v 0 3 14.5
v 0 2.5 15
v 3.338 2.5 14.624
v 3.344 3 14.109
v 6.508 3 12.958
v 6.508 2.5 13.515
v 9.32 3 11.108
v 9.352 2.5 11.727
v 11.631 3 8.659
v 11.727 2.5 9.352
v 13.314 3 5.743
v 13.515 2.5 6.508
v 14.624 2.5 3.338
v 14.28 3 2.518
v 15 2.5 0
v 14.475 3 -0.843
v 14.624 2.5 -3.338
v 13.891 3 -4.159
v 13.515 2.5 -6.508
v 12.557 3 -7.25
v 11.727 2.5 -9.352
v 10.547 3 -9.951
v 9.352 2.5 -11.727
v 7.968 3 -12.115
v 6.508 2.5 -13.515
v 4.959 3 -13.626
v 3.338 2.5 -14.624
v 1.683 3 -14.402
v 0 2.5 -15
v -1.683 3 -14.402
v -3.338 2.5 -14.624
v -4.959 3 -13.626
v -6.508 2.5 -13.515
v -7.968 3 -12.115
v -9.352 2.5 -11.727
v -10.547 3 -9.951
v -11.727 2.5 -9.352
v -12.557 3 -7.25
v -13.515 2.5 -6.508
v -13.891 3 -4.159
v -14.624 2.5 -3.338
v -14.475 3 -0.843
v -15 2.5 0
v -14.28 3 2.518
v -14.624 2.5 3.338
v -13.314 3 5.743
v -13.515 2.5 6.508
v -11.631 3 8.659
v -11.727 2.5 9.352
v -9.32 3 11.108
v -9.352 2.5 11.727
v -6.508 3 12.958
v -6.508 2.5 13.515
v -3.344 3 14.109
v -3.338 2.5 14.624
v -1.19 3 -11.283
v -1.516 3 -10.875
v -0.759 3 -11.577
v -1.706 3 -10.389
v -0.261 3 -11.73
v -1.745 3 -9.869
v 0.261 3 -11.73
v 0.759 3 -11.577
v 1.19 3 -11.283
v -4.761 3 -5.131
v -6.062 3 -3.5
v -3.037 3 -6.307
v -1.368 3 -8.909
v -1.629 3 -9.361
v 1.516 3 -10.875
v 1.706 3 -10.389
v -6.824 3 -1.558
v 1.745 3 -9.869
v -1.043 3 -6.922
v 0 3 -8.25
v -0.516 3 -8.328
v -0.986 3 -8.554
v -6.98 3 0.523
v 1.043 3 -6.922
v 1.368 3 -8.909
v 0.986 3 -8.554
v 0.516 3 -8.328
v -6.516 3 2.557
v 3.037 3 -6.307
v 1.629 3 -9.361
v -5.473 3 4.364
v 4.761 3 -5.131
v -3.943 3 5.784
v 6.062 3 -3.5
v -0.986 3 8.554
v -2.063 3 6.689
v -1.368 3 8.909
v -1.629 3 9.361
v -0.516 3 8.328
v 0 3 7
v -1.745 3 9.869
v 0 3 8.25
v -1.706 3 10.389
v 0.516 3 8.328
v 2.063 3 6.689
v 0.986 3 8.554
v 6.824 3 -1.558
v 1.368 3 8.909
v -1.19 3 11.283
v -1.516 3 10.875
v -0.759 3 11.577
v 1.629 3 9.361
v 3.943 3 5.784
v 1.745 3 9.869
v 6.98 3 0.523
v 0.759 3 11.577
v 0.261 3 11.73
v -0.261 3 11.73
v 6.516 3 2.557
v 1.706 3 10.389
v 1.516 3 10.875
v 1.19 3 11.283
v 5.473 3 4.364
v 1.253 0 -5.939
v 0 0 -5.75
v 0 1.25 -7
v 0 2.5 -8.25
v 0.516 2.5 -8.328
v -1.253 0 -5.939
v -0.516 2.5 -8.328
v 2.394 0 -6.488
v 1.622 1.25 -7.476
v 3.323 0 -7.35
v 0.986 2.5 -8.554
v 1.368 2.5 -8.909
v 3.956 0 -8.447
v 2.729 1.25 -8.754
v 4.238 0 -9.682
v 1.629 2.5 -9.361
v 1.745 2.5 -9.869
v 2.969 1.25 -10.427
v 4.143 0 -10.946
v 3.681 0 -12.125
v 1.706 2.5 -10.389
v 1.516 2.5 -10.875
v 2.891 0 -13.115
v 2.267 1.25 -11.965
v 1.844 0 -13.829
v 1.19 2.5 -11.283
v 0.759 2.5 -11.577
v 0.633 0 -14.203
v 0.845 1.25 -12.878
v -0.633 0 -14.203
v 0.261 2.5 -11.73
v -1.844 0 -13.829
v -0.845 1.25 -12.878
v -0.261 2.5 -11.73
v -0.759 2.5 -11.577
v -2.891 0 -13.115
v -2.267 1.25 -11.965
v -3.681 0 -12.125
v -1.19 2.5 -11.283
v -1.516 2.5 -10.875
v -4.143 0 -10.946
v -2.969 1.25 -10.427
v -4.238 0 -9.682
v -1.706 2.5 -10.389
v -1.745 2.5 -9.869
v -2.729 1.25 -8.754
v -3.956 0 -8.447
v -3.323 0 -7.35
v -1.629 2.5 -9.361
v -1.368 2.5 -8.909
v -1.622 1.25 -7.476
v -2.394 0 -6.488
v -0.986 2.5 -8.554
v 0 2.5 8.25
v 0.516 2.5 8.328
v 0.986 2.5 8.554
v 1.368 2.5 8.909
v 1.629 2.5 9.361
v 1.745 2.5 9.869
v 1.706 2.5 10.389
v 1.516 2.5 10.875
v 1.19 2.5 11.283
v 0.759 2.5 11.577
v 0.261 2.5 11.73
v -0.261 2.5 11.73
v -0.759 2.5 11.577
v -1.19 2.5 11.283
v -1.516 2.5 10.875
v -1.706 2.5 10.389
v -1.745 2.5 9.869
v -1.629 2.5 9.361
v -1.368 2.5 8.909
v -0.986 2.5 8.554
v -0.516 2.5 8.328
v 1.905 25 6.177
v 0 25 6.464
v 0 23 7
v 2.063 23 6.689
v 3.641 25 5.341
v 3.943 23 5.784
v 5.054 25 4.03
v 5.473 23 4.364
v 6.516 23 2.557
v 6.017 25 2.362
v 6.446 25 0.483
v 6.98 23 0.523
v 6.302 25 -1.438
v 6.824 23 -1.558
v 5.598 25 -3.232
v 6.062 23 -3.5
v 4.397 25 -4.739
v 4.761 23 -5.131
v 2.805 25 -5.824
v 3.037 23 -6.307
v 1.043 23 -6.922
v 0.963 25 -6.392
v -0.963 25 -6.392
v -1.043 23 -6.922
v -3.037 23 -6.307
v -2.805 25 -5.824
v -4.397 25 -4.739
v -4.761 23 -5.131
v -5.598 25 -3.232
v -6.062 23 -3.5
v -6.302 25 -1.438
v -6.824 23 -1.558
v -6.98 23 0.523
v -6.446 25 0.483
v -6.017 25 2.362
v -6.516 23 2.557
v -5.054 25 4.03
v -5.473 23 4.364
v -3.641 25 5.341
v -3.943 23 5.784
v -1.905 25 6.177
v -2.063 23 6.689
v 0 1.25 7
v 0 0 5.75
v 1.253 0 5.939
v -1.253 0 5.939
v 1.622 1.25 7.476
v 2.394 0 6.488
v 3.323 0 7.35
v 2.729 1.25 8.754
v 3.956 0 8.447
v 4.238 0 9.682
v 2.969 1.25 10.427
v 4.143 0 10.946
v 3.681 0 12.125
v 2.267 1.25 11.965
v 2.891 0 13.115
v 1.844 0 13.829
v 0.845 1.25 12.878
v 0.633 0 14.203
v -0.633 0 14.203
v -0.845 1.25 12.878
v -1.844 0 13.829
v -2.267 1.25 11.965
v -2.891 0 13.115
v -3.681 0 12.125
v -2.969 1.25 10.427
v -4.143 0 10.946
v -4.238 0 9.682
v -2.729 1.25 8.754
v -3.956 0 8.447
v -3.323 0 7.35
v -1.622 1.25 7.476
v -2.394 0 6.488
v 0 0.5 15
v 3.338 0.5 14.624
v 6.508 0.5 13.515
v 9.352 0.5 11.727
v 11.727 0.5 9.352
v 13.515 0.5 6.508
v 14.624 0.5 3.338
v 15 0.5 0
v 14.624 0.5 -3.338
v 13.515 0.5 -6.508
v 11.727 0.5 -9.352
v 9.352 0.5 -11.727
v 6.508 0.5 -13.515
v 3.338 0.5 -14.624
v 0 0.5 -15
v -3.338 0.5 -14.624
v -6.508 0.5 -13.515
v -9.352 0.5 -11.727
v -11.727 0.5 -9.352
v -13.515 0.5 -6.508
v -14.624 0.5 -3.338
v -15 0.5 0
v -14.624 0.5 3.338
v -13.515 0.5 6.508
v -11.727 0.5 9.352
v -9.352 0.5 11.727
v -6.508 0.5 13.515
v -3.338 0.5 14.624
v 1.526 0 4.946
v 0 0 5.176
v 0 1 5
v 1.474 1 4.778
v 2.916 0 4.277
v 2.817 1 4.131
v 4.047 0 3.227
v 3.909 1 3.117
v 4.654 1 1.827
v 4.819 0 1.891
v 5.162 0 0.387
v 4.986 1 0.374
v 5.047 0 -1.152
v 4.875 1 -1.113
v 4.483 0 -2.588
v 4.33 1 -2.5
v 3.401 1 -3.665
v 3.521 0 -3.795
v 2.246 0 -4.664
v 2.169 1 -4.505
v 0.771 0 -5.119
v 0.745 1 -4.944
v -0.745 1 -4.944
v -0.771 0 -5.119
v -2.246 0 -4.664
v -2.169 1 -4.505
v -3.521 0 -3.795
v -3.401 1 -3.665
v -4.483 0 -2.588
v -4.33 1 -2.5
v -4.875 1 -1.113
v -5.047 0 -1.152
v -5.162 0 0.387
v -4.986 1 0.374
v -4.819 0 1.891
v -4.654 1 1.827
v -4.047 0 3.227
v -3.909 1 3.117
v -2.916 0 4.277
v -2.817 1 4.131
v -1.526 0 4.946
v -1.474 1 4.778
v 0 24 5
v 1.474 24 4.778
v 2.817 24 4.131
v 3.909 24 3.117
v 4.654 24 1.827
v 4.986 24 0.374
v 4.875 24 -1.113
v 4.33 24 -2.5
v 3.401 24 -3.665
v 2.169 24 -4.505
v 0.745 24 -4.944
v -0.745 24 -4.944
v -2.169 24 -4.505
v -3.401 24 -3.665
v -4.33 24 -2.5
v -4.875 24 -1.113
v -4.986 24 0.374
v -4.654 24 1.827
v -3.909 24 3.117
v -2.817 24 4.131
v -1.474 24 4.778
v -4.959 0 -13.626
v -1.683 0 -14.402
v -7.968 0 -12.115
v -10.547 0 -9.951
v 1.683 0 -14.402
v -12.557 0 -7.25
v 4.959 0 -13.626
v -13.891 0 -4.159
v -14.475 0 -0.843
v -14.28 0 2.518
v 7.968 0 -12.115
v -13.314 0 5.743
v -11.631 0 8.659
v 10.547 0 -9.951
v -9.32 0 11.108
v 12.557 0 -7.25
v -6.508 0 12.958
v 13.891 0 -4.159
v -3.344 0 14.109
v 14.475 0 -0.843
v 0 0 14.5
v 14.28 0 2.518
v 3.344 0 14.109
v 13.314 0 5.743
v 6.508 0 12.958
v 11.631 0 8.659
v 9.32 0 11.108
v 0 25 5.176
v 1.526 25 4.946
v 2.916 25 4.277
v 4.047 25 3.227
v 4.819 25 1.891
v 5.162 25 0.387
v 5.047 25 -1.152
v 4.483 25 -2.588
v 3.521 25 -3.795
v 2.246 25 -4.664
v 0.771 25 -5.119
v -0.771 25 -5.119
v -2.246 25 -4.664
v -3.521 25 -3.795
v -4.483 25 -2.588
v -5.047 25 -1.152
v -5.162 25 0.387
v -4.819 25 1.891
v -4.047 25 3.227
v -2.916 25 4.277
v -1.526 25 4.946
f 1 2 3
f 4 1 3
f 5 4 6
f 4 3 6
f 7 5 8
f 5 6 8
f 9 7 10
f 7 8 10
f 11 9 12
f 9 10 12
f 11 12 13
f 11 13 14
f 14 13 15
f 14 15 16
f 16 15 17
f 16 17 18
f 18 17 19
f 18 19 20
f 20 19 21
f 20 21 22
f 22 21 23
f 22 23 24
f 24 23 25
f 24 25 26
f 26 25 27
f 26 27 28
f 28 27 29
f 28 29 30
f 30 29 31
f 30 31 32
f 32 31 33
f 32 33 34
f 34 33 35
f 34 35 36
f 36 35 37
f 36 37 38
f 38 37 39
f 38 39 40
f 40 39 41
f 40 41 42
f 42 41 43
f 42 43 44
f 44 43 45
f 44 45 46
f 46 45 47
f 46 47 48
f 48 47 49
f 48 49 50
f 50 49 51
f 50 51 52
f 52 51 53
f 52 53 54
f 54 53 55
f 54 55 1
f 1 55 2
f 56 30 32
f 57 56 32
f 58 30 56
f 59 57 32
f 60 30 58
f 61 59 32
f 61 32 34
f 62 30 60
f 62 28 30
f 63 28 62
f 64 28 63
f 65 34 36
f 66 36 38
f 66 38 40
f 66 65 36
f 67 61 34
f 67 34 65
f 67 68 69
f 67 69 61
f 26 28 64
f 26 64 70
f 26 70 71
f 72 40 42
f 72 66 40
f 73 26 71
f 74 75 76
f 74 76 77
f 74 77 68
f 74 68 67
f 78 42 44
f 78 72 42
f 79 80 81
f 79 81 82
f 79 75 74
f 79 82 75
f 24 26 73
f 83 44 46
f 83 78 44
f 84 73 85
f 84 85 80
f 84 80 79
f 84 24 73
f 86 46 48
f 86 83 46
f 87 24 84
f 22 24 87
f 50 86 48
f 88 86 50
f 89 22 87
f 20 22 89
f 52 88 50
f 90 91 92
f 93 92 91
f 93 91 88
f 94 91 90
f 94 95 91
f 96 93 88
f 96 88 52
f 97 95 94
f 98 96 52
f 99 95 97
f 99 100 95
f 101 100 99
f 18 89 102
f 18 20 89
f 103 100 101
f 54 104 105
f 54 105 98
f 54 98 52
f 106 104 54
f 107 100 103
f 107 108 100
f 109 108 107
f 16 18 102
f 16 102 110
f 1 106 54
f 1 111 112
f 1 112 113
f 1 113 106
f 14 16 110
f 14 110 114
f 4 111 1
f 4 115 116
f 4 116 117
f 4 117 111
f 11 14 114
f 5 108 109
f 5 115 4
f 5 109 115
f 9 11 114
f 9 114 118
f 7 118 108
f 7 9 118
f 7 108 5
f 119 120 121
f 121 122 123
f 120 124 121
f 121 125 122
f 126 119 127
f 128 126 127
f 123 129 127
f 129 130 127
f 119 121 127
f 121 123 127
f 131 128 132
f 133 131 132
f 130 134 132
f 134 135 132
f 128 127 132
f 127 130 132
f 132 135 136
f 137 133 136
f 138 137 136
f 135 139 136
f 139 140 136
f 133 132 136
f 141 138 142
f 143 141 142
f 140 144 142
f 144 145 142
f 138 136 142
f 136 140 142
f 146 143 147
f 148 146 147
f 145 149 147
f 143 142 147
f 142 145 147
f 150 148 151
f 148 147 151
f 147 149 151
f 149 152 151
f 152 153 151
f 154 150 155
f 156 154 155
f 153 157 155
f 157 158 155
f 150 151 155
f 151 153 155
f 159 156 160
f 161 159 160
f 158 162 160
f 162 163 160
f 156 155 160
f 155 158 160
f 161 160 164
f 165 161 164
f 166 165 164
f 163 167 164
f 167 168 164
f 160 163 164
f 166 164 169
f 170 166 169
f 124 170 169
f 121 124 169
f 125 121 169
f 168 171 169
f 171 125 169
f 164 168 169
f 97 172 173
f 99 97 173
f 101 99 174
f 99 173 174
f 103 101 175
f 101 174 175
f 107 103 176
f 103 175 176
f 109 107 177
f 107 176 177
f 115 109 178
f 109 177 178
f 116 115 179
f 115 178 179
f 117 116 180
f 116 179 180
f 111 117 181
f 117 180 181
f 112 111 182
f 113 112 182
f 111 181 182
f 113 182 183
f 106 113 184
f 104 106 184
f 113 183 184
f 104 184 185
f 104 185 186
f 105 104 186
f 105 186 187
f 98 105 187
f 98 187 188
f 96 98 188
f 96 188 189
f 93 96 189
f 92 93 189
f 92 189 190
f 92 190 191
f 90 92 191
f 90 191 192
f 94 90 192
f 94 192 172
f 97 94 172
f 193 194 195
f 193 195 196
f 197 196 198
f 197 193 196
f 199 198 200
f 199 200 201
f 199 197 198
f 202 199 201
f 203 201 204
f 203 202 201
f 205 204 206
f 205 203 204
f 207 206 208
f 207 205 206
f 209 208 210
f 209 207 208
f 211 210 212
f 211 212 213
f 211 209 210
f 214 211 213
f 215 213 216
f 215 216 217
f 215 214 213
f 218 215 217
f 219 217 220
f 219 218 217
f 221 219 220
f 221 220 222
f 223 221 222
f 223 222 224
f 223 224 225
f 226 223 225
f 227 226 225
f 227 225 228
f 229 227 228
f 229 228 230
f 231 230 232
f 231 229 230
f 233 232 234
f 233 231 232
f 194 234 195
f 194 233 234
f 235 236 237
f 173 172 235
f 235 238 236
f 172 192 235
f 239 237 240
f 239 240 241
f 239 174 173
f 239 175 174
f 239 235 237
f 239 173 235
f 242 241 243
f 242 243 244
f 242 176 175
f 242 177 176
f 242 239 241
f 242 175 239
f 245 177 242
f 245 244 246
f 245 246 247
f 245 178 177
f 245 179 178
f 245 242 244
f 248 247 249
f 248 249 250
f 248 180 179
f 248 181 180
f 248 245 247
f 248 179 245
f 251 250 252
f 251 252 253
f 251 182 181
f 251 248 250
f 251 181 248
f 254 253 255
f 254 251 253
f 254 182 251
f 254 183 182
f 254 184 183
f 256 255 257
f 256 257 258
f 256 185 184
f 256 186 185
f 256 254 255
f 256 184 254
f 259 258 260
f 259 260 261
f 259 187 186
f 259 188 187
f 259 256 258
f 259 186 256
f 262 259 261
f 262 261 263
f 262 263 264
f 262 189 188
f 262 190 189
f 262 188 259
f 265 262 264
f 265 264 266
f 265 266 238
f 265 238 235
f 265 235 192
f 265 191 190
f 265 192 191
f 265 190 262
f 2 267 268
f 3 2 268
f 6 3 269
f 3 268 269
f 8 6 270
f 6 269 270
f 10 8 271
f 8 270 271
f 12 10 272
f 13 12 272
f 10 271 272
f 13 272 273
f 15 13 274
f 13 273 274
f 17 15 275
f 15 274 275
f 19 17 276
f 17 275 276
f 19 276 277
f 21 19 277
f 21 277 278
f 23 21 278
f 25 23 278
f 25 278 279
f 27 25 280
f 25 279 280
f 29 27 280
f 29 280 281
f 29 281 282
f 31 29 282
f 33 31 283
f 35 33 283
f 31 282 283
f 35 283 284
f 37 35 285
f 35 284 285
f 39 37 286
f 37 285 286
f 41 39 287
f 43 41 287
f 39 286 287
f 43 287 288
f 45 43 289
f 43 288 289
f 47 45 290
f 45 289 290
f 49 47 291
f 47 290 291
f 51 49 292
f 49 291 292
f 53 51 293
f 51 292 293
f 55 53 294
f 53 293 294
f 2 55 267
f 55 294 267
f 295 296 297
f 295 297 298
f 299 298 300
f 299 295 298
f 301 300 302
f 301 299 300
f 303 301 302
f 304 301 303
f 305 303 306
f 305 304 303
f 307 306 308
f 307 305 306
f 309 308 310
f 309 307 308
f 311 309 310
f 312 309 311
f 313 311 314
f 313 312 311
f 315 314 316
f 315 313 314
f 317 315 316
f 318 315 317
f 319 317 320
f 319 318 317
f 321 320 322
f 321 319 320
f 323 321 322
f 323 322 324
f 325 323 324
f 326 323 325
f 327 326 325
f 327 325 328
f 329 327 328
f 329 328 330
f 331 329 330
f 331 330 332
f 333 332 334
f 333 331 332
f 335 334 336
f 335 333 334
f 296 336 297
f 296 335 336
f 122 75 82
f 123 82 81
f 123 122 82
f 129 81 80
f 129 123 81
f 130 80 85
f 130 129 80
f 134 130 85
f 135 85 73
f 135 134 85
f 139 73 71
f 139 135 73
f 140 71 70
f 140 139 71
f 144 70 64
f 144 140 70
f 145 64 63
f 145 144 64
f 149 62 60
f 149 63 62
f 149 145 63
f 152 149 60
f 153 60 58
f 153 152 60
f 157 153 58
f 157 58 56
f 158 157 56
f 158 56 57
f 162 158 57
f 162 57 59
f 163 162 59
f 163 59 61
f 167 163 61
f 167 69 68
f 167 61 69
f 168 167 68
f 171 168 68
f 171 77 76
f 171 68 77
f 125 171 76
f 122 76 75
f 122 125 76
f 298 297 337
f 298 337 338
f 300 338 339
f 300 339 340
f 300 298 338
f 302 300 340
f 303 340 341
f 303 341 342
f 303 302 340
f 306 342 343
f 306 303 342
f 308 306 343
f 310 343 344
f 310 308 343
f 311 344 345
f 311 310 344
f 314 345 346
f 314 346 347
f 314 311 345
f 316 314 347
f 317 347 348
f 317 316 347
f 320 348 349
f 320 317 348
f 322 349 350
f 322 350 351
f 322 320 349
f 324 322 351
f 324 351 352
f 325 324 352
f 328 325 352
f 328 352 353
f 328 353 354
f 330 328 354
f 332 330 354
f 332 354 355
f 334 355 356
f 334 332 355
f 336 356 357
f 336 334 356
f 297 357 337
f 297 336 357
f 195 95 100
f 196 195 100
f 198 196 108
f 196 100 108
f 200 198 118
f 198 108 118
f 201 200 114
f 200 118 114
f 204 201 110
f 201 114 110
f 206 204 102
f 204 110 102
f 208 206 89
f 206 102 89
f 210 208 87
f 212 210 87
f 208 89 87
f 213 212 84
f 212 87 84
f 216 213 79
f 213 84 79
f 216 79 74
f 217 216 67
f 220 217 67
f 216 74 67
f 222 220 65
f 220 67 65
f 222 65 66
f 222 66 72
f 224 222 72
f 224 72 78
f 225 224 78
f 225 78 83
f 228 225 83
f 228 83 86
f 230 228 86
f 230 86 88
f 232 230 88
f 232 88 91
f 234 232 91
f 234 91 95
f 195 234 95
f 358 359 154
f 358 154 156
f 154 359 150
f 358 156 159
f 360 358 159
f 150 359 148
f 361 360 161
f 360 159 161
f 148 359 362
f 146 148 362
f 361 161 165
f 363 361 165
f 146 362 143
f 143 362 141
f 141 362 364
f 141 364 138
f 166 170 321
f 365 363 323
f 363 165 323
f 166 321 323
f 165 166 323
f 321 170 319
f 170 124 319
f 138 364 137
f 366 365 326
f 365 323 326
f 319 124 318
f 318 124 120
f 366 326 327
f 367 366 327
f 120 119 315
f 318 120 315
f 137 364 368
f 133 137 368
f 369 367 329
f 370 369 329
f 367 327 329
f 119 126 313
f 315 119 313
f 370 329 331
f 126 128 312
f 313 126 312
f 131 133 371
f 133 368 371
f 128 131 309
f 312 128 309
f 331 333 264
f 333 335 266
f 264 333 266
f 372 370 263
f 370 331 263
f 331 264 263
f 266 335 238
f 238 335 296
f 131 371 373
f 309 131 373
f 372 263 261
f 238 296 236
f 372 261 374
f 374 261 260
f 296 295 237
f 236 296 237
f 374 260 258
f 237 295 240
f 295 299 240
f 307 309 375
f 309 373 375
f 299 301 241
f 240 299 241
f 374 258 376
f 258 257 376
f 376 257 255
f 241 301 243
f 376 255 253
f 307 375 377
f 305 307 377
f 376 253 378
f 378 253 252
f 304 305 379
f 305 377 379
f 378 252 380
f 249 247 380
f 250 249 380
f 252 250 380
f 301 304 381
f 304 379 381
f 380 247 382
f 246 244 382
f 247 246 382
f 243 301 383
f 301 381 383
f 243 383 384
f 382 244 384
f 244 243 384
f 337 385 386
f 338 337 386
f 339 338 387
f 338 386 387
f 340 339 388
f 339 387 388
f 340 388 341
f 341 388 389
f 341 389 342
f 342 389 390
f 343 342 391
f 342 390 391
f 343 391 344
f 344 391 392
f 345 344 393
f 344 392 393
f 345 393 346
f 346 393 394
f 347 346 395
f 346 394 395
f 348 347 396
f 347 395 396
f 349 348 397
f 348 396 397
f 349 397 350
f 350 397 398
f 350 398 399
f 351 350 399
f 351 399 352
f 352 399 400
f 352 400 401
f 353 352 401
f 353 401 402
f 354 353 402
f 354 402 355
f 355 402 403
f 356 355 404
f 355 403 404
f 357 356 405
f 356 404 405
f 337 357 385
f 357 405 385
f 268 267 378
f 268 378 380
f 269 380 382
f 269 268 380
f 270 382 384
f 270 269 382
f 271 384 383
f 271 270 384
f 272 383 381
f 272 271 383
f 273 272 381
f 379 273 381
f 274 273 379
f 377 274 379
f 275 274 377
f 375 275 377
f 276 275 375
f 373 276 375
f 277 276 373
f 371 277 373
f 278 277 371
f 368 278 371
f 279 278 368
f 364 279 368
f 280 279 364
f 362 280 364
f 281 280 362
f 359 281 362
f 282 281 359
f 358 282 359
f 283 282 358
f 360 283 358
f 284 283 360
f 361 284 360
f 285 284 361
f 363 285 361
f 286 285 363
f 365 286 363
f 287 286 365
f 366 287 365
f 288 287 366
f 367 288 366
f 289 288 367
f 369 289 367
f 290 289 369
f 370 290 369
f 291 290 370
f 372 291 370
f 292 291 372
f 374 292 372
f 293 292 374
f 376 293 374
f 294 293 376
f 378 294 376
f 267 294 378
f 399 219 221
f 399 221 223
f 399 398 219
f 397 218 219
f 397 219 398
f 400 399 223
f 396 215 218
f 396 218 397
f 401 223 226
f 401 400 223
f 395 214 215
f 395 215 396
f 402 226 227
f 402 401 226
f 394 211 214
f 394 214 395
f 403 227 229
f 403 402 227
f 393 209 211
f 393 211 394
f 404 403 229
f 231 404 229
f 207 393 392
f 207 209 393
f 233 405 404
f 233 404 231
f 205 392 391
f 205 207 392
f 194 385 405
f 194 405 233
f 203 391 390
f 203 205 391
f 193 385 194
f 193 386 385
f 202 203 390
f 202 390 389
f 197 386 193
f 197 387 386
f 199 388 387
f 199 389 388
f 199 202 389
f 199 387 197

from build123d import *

# Parameters (mm, degrees)
SKETCH_1_R                   = 15
SKETCH_1_R_2                 = 5
EXTRUDE_1_DEPTH              = 3
SKETCH_1_3_R                 = 7
SKETCH_1_3_R_2               = 5
EXTRUDE_2_DEPTH              = 25
SKETCH_2_R                   = 1.75
CUT_EXTRUDE_1_DEPTH          = 33.787192622
CHAMFER_1_SIZE               = 2.5
CHAMFER_1_OF_MIRROR_659_SIZE = 2.5
CHAMFER_2_SIZE               = 2
CHAMFER_2_SIZE2              = 0.535898385
CHAMFER_4_SIZE               = 1
CHAMFER_4_SIZE2              = 0.176326981
CHAMFER_5_SIZE               = 0.5


with BuildPart() as part:
    # 草图1 → 凸台-拉伸1 (new body)
    with BuildSketch(Plane(origin=(0, 0, 0), x_dir=(1, 0, 0), z_dir=(0, 1, 0))):
        Circle(SKETCH_1_R)
        Circle(SKETCH_1_R_2, mode=Mode.SUBTRACT)
    extrude(amount=EXTRUDE_1_DEPTH)

    # 草图1<3> → 凸台-拉伸2 (add)
    with BuildSketch(Plane(origin=(0, 0, 0), x_dir=(1, 0, 0), z_dir=(0, 1, 0))):
        Circle(SKETCH_1_3_R)
        Circle(SKETCH_1_3_R_2, mode=Mode.SUBTRACT)
    extrude(amount=EXTRUDE_2_DEPTH)

    # 草图2 → 切除-拉伸1 (cut, through all)
    with BuildSketch(Plane.XZ):
        with Locations((0, 10)):
            Circle(SKETCH_2_R)
    cut_extrude_1 = extrude(amount=-CUT_EXTRUDE_1_DEPTH, mode=Mode.SUBTRACT)

    # 倒角1
    chamfer_1_edges = [part.edges().sort_by_distance(p)[0] for p in [
        (-1.75, 0, 10),
    ]]
    chamfer(chamfer_1_edges, length=CHAMFER_1_SIZE)

    # Mirror 659: 切除-拉伸1 across plane
    add(cut_extrude_1.mirror(Plane.XY), mode=Mode.SUBTRACT)

    # 倒角1 of Mirror 659
    chamfer_1_of_mirror_659_edges = [part.edges().sort_by_distance(p)[0] for p in [
        (-1.75, 0, -10),
    ]]
    chamfer(chamfer_1_of_mirror_659_edges, length=CHAMFER_1_OF_MIRROR_659_SIZE)

    # 倒角2
    chamfer_2_edges = [part.edges().sort_by_distance(p)[0] for p in [
        (-7, 25, 0),
    ]]
    chamfer_2_side = [part.faces().sort_by_distance(p)[0] for p in [
        (-7, 14, 0),
    ]]
    chamfer(chamfer_2_edges, length=CHAMFER_2_SIZE, length2=CHAMFER_2_SIZE2, reference=chamfer_2_side[0])

    # 倒角4
    chamfer_4_edges = [part.edges().sort_by_distance(p)[0] for p in [
        (-5, 0, 0),
        (-5, 25, 0),
    ]]
    chamfer_4_side = [part.faces().sort_by_distance(p)[0] for p in [
        (-5, 12.5, 0),
    ]]
    chamfer(chamfer_4_edges, length=CHAMFER_4_SIZE, length2=CHAMFER_4_SIZE2, reference=chamfer_4_side[0])

    # 倒角5
    chamfer_5_edges = [part.edges().sort_by_distance(p)[0] for p in [
        (-15, 0, 0),
        (-15, 3, 0),
    ]]
    chamfer(chamfer_5_edges, length=CHAMFER_5_SIZE)


solid = part.part
